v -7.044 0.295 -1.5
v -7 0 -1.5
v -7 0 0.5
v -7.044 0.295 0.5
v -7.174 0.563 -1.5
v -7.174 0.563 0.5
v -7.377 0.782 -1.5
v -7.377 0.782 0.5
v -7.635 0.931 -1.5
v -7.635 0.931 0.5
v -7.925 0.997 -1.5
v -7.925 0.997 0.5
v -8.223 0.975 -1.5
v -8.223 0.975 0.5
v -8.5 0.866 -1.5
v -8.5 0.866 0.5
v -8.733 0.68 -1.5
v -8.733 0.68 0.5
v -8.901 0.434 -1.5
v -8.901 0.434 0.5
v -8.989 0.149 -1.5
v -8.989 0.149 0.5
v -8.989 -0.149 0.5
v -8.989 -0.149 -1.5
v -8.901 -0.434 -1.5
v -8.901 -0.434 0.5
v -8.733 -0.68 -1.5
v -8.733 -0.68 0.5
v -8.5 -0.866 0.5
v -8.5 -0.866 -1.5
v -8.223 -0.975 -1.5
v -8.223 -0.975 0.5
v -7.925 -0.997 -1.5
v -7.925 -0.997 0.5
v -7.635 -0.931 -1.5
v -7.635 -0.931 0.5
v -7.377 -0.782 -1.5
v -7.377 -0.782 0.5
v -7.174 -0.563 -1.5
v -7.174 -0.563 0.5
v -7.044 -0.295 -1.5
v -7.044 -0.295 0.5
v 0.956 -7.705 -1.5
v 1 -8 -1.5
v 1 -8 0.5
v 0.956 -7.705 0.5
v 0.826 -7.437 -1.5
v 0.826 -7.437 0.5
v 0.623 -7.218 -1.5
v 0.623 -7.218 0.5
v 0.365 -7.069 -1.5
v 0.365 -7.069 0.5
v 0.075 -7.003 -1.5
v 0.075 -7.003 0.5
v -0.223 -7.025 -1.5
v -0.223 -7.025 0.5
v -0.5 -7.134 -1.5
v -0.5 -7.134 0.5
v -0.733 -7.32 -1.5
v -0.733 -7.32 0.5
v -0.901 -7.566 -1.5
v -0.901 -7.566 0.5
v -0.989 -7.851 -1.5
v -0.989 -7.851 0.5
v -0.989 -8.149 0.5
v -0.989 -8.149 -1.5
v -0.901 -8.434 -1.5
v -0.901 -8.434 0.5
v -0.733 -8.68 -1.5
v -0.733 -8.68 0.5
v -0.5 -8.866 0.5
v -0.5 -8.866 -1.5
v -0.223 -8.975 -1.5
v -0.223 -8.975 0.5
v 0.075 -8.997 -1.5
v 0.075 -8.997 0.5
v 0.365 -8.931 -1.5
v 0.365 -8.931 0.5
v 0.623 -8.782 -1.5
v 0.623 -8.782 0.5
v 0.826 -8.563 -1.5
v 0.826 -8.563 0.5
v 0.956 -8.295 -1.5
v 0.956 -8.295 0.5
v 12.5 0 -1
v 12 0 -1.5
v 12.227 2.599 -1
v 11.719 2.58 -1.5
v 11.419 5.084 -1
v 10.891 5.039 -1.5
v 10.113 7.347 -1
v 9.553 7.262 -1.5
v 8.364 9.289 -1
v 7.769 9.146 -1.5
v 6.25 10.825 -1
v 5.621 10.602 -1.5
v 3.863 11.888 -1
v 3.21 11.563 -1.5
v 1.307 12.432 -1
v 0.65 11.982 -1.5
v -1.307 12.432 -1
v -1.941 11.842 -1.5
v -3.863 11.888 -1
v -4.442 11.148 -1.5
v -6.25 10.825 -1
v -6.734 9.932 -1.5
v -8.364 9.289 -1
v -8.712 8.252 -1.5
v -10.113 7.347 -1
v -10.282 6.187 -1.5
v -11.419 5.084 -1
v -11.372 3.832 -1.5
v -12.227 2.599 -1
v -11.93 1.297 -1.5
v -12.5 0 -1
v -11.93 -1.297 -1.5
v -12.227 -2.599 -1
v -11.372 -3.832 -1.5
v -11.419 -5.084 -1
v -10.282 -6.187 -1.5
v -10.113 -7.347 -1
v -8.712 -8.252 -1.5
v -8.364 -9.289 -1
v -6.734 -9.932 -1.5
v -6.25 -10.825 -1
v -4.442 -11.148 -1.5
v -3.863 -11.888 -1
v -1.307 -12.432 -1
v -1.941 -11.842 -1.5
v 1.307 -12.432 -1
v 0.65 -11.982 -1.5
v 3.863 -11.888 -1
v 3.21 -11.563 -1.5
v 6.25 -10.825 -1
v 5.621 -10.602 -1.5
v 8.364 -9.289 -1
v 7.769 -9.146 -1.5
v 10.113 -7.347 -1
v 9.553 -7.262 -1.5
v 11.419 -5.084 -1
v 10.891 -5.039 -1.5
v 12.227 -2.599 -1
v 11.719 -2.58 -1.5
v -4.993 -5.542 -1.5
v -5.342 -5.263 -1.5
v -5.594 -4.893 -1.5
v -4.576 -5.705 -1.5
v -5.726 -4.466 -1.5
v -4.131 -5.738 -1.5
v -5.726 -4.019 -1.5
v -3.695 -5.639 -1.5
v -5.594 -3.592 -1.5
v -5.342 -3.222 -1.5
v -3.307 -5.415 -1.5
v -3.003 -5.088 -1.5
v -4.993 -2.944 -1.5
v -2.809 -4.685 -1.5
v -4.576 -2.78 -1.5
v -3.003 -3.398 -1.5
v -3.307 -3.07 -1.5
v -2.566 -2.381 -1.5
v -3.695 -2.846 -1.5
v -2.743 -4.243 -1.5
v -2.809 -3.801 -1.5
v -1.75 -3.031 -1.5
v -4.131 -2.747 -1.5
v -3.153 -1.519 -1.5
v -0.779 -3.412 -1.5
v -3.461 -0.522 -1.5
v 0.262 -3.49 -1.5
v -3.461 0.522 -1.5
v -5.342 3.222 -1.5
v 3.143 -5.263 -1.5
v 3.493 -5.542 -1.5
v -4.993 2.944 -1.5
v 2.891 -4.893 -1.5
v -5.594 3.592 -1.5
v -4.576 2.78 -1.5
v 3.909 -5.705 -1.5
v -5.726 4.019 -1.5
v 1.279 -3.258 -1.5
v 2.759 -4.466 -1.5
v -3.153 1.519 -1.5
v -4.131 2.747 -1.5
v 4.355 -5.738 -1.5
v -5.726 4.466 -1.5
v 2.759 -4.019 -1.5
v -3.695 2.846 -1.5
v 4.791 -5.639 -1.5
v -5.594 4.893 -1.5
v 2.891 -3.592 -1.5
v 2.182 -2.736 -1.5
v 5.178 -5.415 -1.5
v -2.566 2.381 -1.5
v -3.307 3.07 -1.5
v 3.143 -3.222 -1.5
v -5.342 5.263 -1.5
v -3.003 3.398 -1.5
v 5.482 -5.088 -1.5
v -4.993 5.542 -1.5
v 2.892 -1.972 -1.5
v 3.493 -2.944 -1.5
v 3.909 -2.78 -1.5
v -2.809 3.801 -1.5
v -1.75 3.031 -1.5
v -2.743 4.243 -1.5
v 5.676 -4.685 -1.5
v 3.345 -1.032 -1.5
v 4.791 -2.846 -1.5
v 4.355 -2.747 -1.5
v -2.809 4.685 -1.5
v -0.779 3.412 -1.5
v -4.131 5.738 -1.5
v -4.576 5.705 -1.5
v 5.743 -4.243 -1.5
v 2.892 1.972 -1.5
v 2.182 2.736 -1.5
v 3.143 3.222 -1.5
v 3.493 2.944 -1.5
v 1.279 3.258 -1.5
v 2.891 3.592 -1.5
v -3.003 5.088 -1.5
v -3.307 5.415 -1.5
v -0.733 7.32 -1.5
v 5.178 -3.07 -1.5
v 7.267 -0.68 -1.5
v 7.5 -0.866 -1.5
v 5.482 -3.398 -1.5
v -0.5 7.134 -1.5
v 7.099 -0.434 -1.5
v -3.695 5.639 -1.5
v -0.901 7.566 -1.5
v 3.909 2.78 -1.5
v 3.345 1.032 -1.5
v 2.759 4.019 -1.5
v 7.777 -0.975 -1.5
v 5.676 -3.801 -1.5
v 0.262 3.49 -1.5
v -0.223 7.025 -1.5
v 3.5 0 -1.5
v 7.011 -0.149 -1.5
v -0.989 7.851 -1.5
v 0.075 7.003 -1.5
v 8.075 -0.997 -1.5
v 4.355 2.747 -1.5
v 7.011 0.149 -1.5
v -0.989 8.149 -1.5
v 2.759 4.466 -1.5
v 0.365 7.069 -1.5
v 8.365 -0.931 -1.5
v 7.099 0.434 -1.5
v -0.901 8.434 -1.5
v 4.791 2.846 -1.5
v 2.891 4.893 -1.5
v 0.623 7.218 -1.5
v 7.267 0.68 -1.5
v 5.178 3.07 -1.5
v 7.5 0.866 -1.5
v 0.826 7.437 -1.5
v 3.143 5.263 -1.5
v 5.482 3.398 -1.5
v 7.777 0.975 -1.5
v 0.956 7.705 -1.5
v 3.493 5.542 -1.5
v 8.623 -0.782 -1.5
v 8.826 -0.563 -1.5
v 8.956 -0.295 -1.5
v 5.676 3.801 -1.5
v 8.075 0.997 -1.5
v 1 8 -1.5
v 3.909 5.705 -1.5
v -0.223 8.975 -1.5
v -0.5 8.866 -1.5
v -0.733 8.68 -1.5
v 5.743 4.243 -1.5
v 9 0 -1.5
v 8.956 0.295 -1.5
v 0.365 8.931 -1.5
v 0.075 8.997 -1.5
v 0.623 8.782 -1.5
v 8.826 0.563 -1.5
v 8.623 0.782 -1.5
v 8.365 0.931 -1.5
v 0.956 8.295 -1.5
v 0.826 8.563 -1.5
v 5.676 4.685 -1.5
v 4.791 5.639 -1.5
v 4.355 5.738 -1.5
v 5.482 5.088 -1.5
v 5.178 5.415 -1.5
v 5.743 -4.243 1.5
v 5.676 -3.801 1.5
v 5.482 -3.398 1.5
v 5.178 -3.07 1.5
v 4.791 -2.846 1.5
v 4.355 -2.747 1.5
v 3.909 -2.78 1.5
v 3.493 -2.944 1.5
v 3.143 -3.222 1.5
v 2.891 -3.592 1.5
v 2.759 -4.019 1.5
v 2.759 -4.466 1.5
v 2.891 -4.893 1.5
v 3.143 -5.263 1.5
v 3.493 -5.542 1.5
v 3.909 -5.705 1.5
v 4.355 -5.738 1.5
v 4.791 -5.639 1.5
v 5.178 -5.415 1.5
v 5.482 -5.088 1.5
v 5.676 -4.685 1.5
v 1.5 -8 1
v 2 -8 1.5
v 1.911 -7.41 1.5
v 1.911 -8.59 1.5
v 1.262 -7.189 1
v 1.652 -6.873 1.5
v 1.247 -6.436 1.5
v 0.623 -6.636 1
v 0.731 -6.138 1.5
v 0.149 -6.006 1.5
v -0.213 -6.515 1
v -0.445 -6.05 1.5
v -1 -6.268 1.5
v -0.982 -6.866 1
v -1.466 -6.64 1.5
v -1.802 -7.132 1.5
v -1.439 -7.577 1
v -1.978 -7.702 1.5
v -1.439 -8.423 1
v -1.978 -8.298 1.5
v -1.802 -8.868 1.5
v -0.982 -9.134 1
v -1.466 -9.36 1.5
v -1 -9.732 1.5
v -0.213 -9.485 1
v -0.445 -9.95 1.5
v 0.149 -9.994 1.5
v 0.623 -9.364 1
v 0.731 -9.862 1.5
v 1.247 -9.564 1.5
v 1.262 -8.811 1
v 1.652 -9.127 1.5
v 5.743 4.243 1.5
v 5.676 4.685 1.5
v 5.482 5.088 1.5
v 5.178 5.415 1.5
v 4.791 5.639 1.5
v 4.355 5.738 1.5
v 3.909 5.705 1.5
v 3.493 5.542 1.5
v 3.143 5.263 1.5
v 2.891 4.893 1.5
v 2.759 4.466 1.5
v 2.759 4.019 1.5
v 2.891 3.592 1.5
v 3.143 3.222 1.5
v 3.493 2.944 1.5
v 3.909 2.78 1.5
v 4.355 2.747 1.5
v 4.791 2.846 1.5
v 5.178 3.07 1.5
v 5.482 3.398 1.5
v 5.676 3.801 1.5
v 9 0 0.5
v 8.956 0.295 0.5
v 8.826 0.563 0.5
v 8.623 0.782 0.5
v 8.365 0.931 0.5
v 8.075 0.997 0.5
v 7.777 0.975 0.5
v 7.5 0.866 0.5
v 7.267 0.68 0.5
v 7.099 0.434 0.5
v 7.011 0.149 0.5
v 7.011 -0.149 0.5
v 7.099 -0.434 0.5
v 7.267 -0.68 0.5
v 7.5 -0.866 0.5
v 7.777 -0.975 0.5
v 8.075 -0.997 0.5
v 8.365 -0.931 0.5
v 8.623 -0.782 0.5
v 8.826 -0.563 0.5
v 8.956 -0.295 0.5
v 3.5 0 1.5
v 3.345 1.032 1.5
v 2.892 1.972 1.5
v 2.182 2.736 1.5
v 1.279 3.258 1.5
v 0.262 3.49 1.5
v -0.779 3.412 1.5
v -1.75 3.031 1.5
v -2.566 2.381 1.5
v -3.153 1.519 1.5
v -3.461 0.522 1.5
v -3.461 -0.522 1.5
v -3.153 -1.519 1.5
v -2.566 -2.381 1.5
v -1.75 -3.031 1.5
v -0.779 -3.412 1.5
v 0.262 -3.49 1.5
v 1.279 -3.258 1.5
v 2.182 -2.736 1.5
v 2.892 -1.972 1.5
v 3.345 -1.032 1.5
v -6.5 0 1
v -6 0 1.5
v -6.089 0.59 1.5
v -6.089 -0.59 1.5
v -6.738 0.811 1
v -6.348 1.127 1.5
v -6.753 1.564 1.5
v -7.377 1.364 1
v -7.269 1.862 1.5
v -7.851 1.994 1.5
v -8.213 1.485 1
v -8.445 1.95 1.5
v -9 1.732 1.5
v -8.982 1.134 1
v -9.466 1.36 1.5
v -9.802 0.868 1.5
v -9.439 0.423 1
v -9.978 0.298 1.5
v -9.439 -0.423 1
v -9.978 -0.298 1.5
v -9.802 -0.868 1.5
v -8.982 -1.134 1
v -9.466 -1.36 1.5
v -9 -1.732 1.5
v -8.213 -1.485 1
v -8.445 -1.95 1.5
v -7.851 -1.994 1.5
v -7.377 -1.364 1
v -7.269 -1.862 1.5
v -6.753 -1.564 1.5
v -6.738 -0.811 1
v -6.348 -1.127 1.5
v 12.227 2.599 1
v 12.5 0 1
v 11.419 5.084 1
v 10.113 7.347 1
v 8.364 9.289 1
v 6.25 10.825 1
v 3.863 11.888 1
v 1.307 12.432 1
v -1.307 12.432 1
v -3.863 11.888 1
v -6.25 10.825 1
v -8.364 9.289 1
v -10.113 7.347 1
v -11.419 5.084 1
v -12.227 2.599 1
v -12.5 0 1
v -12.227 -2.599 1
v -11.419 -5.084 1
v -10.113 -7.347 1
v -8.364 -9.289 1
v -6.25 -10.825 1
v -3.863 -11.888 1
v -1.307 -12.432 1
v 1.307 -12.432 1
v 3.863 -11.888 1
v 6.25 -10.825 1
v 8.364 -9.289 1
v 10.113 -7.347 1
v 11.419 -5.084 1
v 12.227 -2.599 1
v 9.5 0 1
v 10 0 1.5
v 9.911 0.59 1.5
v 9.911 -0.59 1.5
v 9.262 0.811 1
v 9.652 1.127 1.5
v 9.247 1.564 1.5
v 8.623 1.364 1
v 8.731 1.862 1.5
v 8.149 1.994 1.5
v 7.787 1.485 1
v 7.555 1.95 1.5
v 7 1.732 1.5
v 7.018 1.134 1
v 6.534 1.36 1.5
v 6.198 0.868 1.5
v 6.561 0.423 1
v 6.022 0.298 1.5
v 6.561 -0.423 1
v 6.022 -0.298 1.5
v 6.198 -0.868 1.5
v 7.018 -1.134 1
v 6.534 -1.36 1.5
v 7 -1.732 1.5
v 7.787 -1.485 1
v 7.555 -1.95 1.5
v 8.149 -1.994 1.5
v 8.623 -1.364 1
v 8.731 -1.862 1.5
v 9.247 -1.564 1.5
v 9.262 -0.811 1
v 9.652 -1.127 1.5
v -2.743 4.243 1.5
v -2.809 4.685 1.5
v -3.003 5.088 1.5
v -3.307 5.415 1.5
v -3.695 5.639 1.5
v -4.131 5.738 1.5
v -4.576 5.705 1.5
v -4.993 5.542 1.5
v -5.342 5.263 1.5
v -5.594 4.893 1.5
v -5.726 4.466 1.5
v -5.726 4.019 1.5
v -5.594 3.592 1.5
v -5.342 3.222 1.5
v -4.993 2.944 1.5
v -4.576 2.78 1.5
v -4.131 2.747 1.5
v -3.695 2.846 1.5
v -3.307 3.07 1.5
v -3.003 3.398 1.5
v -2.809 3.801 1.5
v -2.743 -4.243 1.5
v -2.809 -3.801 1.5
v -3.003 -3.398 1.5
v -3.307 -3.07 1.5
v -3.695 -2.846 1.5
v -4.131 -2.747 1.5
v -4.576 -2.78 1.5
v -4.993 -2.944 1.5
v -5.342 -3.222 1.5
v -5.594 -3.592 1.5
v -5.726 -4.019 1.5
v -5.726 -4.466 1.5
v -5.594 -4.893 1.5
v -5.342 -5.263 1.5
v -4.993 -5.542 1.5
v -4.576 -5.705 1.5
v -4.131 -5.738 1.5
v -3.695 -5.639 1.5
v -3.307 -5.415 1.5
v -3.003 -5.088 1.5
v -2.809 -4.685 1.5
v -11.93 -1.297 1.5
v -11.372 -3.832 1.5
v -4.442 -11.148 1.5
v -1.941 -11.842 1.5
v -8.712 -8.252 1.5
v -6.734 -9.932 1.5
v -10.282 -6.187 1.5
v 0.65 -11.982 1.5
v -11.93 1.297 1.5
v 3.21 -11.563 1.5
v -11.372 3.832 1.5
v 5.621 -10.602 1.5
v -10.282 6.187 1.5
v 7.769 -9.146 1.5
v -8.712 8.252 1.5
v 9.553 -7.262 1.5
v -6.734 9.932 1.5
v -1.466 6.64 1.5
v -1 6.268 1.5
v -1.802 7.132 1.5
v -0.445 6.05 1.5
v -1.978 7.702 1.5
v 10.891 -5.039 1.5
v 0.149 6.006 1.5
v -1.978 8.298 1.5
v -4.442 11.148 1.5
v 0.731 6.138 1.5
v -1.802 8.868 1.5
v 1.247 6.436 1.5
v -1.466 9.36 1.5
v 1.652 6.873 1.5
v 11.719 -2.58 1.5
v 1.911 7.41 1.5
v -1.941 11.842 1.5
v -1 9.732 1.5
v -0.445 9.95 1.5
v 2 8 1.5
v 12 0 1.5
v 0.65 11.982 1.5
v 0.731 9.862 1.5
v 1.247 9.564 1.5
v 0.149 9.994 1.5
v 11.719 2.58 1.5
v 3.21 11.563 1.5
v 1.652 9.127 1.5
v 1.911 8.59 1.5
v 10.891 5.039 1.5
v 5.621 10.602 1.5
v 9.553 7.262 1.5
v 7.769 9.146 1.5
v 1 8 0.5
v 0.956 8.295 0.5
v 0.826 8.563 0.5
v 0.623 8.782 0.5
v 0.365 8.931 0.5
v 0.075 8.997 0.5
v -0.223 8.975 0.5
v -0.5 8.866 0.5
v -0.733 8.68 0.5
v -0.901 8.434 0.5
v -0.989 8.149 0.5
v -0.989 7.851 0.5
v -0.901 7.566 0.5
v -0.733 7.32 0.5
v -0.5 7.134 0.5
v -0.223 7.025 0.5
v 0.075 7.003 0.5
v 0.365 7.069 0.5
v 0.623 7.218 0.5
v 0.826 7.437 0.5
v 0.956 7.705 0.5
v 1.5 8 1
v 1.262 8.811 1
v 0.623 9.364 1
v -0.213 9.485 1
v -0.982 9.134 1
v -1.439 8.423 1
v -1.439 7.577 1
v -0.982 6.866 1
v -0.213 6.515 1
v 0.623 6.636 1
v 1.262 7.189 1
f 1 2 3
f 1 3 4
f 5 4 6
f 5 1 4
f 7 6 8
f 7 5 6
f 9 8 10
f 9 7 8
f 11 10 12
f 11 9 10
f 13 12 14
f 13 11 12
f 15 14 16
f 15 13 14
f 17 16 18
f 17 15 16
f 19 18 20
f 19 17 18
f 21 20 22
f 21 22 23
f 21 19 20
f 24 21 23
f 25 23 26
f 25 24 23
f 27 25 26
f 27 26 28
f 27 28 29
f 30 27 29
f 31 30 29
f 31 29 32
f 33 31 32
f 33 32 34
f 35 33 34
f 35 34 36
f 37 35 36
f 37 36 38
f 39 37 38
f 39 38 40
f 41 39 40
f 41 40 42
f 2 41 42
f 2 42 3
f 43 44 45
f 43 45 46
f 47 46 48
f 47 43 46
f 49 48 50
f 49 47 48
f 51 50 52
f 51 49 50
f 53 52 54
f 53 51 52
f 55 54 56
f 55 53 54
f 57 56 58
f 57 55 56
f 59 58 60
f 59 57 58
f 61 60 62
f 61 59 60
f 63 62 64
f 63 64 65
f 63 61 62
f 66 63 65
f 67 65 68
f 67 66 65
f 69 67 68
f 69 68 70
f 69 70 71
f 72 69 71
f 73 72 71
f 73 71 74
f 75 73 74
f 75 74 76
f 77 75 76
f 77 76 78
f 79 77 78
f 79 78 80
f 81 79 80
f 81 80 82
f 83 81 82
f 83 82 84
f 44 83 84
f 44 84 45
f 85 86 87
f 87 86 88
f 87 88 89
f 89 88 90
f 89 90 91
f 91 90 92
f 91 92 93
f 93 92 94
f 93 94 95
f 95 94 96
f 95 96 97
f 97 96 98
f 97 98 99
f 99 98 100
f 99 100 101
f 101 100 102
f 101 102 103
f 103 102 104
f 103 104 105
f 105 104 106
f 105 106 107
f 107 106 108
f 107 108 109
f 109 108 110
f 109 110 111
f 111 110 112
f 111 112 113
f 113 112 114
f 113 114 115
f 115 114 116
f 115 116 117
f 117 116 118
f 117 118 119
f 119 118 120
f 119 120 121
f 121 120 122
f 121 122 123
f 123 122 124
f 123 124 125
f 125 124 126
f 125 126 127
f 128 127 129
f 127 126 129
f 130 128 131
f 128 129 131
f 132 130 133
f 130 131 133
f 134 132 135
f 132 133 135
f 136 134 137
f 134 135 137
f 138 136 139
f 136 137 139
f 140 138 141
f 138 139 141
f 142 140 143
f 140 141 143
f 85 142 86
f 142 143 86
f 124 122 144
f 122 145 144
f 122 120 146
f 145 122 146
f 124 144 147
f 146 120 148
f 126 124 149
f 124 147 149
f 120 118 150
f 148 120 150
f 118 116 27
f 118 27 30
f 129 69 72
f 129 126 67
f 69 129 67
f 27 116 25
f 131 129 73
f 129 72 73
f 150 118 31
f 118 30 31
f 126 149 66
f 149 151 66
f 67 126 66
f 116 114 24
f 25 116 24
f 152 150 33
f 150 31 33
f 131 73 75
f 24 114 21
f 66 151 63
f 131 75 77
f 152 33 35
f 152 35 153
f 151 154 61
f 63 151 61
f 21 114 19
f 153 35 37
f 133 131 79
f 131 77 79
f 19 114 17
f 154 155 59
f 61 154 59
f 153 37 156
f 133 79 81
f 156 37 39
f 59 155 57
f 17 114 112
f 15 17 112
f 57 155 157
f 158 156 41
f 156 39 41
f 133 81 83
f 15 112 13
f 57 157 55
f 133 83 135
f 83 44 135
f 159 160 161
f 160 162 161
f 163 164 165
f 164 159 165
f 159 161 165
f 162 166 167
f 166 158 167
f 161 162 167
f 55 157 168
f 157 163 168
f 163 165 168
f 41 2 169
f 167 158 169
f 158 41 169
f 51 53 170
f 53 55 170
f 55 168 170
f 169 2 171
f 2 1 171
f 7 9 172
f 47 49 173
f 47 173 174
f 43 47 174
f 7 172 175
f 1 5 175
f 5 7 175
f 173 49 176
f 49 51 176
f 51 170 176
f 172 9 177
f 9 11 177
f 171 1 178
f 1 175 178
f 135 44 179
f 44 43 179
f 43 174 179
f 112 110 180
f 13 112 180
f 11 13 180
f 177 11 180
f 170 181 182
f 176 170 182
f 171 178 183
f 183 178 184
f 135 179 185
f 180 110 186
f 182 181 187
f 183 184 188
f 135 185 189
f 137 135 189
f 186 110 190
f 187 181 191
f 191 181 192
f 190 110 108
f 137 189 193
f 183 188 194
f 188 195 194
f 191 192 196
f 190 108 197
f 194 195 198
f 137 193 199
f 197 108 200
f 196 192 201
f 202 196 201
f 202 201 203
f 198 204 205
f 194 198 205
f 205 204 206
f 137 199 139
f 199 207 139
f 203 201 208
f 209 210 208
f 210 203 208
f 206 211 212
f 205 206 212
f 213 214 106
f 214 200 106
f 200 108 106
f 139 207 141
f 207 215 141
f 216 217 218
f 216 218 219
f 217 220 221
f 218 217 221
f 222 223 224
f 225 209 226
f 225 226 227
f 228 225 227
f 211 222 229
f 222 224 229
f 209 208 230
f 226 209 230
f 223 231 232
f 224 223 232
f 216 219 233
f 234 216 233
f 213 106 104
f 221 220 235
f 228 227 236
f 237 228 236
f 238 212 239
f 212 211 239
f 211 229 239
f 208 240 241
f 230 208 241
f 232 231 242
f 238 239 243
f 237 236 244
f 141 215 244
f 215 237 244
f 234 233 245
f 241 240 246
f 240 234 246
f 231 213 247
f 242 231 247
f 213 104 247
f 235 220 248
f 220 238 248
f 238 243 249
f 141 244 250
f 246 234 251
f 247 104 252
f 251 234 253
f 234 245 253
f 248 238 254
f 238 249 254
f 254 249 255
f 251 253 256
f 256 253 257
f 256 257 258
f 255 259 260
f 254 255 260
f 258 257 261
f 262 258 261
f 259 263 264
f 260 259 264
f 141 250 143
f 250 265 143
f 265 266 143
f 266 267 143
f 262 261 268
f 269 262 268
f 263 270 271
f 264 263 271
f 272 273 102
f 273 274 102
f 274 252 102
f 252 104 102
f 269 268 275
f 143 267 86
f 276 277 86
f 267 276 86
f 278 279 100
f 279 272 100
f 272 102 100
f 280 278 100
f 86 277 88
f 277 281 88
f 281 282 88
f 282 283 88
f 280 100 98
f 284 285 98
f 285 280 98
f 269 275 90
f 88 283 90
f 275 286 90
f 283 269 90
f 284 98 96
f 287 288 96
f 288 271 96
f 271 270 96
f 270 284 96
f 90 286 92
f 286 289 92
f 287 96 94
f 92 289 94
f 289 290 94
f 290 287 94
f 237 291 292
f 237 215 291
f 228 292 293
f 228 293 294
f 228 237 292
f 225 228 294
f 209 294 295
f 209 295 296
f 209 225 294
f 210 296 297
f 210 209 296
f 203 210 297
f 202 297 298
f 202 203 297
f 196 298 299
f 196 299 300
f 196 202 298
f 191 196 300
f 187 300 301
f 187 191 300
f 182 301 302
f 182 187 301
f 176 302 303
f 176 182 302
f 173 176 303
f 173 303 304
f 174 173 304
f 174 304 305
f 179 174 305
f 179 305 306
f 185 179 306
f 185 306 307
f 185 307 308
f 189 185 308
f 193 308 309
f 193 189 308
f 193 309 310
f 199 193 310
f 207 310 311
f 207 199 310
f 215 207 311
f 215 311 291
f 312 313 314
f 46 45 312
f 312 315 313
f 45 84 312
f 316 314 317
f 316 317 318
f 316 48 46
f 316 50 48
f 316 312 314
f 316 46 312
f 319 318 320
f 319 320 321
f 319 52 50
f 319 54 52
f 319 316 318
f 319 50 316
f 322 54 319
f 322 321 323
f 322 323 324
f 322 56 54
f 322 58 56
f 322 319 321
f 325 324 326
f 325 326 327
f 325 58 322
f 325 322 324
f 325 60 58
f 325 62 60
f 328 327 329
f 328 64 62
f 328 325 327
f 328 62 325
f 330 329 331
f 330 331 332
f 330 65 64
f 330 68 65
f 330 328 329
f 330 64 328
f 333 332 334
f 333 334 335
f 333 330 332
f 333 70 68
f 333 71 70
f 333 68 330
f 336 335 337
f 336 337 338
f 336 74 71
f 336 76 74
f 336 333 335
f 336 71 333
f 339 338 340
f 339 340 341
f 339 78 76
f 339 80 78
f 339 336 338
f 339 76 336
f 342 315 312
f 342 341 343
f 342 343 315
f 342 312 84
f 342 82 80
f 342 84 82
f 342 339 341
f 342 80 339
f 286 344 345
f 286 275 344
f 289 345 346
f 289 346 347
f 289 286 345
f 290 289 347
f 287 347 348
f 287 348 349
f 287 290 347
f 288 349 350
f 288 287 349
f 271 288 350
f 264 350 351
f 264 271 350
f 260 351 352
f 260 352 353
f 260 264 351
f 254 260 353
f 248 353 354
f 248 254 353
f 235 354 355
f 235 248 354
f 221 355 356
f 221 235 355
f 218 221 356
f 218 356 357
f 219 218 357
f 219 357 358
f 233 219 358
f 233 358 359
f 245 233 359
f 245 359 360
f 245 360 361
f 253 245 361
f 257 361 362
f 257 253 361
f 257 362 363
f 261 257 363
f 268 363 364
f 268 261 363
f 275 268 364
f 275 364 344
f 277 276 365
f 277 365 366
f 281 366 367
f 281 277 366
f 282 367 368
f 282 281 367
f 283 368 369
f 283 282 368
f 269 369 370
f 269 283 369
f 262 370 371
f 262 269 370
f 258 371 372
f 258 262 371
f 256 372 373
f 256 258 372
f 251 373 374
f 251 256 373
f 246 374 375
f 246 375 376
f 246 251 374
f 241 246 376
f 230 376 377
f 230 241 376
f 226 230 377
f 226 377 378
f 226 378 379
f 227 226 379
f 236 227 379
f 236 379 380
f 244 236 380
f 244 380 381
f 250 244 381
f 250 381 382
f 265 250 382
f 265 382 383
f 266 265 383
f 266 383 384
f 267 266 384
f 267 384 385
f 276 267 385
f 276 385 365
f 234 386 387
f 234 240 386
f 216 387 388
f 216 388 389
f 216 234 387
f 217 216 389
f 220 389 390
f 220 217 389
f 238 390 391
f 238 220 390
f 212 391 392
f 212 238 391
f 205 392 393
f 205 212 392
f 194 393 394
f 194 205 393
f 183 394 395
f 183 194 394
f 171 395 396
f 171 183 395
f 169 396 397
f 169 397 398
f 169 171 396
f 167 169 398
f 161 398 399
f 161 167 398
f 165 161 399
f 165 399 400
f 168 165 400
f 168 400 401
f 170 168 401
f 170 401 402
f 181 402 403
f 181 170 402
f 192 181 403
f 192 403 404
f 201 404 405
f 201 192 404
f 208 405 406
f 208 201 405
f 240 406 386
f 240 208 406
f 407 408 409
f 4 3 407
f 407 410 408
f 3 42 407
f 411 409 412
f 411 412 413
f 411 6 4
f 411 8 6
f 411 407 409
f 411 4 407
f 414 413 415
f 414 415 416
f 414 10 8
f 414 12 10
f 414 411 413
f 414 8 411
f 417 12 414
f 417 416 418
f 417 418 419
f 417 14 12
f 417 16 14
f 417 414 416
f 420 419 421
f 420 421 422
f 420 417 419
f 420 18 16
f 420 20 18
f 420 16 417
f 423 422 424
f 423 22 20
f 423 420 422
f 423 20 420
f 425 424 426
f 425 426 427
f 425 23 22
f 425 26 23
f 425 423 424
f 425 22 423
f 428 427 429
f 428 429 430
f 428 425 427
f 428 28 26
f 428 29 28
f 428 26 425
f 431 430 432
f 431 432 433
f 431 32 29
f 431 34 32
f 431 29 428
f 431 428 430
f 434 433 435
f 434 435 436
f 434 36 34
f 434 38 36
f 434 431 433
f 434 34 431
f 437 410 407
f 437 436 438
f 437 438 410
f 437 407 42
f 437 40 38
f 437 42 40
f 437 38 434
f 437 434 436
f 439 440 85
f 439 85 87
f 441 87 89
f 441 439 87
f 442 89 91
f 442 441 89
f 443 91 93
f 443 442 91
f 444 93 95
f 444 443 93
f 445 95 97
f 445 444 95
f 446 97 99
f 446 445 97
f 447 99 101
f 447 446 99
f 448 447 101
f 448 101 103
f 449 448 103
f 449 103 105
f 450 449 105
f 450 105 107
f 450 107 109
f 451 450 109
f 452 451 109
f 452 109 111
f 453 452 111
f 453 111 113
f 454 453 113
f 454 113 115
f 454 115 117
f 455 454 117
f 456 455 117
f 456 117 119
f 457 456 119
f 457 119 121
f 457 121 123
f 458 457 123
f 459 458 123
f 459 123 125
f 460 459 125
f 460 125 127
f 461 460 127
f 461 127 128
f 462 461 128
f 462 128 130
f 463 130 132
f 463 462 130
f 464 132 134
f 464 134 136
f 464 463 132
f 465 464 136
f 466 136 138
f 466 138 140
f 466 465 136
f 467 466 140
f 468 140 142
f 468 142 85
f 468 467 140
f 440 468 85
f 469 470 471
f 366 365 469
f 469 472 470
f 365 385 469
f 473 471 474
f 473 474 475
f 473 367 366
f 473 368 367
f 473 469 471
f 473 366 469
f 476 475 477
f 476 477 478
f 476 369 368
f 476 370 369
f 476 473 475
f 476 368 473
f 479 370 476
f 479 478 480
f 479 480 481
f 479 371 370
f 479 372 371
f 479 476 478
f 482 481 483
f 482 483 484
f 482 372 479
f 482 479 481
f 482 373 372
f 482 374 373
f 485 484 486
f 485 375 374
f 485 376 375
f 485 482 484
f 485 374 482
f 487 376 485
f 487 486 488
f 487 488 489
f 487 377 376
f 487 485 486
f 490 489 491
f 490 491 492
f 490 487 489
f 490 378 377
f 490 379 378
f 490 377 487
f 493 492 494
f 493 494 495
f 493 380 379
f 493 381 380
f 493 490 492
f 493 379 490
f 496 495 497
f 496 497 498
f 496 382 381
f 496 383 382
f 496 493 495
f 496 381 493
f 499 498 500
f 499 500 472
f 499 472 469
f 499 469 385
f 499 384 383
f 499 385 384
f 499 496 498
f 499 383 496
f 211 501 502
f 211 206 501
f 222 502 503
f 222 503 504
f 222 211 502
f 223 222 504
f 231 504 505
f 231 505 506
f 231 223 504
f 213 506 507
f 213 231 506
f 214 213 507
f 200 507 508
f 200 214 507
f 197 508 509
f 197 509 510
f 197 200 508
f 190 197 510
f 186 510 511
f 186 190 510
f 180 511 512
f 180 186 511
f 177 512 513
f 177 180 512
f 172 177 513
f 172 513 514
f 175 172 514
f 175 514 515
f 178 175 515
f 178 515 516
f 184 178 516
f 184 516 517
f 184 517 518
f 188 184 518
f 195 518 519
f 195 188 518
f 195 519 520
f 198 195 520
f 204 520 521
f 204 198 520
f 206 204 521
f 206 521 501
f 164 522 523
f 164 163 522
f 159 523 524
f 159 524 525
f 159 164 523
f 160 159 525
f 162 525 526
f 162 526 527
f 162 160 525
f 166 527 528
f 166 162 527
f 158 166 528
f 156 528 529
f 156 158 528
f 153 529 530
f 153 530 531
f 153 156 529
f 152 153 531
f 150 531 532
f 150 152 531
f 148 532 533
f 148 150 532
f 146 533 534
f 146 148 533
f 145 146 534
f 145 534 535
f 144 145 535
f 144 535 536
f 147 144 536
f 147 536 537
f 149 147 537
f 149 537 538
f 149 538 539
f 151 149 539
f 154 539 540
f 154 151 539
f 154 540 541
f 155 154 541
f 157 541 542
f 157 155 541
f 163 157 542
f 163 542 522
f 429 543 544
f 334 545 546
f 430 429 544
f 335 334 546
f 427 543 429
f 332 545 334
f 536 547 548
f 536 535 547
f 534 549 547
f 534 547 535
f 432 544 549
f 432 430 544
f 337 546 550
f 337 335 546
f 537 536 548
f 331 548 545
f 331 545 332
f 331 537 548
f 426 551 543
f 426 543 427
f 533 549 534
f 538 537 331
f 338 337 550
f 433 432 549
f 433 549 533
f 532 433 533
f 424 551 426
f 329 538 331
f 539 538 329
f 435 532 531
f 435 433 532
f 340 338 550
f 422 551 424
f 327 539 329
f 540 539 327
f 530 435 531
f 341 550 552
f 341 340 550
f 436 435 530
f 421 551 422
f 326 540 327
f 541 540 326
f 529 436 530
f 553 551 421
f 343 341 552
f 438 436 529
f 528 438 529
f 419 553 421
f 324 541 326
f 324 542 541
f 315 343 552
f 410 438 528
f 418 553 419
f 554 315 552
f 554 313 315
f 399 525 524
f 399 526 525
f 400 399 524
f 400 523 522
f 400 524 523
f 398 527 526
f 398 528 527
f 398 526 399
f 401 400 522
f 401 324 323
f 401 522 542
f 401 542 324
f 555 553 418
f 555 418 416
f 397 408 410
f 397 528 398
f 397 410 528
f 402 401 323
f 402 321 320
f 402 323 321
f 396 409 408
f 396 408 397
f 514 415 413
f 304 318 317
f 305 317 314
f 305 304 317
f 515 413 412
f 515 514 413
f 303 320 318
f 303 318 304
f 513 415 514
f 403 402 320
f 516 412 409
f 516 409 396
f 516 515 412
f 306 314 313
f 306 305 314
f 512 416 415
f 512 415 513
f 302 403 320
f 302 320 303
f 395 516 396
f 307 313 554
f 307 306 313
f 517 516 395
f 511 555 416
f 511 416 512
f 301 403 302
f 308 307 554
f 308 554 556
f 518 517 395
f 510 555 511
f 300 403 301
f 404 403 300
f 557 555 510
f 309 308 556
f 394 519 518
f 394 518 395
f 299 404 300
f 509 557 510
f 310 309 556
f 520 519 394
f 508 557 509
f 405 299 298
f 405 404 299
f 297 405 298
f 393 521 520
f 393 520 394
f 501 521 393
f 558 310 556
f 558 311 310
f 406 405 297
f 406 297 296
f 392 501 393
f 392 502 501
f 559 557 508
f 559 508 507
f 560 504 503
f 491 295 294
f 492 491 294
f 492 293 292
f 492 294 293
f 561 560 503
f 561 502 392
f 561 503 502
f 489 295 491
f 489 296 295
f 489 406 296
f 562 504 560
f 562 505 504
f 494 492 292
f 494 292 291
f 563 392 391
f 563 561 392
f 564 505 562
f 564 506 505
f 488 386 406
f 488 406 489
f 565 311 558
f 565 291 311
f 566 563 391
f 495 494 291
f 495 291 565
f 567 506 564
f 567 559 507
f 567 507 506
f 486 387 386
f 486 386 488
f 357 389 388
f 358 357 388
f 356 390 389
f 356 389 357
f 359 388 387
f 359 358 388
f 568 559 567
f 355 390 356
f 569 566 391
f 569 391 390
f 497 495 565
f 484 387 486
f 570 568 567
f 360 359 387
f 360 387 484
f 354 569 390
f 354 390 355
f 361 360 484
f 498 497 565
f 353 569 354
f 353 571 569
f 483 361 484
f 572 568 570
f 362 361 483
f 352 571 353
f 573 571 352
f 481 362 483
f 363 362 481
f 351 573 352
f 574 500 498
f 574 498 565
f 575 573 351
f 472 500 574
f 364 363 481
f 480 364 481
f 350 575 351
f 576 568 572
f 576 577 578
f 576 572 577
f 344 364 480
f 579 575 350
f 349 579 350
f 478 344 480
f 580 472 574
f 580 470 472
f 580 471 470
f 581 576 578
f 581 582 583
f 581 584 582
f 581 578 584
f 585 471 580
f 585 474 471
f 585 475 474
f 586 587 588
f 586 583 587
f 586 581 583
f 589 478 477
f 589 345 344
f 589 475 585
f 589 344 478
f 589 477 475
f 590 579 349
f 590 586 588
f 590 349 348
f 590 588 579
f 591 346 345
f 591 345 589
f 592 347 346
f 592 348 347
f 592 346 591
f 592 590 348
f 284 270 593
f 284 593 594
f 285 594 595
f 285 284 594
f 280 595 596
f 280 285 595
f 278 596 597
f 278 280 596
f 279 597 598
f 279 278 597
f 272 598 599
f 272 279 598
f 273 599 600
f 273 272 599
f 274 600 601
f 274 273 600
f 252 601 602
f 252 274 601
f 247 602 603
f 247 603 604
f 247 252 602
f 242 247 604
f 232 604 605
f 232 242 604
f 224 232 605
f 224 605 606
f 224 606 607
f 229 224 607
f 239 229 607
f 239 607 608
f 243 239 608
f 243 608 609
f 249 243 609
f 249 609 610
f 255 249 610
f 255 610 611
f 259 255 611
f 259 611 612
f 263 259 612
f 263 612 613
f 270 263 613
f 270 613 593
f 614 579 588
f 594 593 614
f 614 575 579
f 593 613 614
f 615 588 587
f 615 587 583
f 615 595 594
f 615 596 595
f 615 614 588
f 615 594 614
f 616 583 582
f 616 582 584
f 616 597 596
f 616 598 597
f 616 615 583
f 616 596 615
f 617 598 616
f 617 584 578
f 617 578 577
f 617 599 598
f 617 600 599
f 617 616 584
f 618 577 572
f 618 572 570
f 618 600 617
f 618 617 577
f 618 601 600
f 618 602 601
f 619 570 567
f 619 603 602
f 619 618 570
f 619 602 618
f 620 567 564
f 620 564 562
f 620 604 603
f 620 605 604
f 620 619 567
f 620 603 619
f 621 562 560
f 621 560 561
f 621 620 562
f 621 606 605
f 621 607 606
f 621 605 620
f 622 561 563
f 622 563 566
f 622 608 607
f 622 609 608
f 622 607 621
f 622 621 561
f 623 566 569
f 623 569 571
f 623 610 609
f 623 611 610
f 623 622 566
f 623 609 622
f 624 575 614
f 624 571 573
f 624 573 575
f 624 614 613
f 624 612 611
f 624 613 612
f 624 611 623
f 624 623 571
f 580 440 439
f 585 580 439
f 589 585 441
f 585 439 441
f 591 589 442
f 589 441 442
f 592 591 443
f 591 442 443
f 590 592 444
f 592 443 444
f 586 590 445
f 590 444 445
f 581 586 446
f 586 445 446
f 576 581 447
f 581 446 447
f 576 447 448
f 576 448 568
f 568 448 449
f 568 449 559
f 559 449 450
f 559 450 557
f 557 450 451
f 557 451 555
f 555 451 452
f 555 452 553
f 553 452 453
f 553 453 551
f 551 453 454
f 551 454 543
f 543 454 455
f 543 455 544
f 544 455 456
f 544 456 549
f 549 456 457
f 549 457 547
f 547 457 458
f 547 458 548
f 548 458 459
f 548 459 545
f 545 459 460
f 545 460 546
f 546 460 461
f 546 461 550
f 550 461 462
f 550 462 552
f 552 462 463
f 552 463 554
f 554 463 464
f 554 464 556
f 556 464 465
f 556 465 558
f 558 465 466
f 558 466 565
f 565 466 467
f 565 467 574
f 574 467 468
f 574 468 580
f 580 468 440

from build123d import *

# Parameters (mm, degrees)
SKETCH_1_R      = 12.5
SKETCH_1_R_2    = 1
SKETCH_1_R_3    = 1.5
SKETCH_1_R_4    = 3.5
EXTRUDE_1_DEPTH = 1.5
CHAMFER_2_SIZE  = 1
CHAMFER_1_SIZE  = 0.5


with BuildPart() as part:
    # 草图1 → 凸台-拉伸1 (new, symmetric)
    with BuildSketch(Plane.XY):
        Circle(SKETCH_1_R)
        with Locations((0, 8)):
            Circle(SKETCH_1_R_2, mode=Mode.SUBTRACT)
        with Locations((8, 0)):
            Circle(SKETCH_1_R_2, mode=Mode.SUBTRACT)
        with Locations((0, -8)):
            Circle(SKETCH_1_R_2, mode=Mode.SUBTRACT)
        with Locations((-8, 0)):
            Circle(SKETCH_1_R_2, mode=Mode.SUBTRACT)
        with Locations((-4.242640687, 4.242640687)):
            Circle(SKETCH_1_R_3, mode=Mode.SUBTRACT)
        Circle(SKETCH_1_R_4, mode=Mode.SUBTRACT)
        with Locations((4.242640687, 4.242640687)):
            Circle(SKETCH_1_R_3, mode=Mode.SUBTRACT)
        with Locations((4.242640687, -4.242640687)):
            Circle(SKETCH_1_R_3, mode=Mode.SUBTRACT)
        with Locations((-4.242640687, -4.242640687)):
            Circle(SKETCH_1_R_3, mode=Mode.SUBTRACT)
    extrude(amount=EXTRUDE_1_DEPTH, both=True)

    # 倒角2
    chamfer_2_edges = [part.edges().sort_by_distance(p)[0] for p in [
        (-1, -8, 1.5),
        (-9, 0, 1.5),
        (-1, 8, 1.5),
        (7, 0, 1.5),
    ]]
    chamfer(chamfer_2_edges, length=CHAMFER_2_SIZE)

    # 倒角1
    chamfer_1_edges = [part.edges().sort_by_distance(p)[0] for p in [
        (-12.5, 0, -1.5),
        (-12.5, 0, 1.5),
    ]]
    chamfer(chamfer_1_edges, length=CHAMFER_1_SIZE)


solid = part.part
